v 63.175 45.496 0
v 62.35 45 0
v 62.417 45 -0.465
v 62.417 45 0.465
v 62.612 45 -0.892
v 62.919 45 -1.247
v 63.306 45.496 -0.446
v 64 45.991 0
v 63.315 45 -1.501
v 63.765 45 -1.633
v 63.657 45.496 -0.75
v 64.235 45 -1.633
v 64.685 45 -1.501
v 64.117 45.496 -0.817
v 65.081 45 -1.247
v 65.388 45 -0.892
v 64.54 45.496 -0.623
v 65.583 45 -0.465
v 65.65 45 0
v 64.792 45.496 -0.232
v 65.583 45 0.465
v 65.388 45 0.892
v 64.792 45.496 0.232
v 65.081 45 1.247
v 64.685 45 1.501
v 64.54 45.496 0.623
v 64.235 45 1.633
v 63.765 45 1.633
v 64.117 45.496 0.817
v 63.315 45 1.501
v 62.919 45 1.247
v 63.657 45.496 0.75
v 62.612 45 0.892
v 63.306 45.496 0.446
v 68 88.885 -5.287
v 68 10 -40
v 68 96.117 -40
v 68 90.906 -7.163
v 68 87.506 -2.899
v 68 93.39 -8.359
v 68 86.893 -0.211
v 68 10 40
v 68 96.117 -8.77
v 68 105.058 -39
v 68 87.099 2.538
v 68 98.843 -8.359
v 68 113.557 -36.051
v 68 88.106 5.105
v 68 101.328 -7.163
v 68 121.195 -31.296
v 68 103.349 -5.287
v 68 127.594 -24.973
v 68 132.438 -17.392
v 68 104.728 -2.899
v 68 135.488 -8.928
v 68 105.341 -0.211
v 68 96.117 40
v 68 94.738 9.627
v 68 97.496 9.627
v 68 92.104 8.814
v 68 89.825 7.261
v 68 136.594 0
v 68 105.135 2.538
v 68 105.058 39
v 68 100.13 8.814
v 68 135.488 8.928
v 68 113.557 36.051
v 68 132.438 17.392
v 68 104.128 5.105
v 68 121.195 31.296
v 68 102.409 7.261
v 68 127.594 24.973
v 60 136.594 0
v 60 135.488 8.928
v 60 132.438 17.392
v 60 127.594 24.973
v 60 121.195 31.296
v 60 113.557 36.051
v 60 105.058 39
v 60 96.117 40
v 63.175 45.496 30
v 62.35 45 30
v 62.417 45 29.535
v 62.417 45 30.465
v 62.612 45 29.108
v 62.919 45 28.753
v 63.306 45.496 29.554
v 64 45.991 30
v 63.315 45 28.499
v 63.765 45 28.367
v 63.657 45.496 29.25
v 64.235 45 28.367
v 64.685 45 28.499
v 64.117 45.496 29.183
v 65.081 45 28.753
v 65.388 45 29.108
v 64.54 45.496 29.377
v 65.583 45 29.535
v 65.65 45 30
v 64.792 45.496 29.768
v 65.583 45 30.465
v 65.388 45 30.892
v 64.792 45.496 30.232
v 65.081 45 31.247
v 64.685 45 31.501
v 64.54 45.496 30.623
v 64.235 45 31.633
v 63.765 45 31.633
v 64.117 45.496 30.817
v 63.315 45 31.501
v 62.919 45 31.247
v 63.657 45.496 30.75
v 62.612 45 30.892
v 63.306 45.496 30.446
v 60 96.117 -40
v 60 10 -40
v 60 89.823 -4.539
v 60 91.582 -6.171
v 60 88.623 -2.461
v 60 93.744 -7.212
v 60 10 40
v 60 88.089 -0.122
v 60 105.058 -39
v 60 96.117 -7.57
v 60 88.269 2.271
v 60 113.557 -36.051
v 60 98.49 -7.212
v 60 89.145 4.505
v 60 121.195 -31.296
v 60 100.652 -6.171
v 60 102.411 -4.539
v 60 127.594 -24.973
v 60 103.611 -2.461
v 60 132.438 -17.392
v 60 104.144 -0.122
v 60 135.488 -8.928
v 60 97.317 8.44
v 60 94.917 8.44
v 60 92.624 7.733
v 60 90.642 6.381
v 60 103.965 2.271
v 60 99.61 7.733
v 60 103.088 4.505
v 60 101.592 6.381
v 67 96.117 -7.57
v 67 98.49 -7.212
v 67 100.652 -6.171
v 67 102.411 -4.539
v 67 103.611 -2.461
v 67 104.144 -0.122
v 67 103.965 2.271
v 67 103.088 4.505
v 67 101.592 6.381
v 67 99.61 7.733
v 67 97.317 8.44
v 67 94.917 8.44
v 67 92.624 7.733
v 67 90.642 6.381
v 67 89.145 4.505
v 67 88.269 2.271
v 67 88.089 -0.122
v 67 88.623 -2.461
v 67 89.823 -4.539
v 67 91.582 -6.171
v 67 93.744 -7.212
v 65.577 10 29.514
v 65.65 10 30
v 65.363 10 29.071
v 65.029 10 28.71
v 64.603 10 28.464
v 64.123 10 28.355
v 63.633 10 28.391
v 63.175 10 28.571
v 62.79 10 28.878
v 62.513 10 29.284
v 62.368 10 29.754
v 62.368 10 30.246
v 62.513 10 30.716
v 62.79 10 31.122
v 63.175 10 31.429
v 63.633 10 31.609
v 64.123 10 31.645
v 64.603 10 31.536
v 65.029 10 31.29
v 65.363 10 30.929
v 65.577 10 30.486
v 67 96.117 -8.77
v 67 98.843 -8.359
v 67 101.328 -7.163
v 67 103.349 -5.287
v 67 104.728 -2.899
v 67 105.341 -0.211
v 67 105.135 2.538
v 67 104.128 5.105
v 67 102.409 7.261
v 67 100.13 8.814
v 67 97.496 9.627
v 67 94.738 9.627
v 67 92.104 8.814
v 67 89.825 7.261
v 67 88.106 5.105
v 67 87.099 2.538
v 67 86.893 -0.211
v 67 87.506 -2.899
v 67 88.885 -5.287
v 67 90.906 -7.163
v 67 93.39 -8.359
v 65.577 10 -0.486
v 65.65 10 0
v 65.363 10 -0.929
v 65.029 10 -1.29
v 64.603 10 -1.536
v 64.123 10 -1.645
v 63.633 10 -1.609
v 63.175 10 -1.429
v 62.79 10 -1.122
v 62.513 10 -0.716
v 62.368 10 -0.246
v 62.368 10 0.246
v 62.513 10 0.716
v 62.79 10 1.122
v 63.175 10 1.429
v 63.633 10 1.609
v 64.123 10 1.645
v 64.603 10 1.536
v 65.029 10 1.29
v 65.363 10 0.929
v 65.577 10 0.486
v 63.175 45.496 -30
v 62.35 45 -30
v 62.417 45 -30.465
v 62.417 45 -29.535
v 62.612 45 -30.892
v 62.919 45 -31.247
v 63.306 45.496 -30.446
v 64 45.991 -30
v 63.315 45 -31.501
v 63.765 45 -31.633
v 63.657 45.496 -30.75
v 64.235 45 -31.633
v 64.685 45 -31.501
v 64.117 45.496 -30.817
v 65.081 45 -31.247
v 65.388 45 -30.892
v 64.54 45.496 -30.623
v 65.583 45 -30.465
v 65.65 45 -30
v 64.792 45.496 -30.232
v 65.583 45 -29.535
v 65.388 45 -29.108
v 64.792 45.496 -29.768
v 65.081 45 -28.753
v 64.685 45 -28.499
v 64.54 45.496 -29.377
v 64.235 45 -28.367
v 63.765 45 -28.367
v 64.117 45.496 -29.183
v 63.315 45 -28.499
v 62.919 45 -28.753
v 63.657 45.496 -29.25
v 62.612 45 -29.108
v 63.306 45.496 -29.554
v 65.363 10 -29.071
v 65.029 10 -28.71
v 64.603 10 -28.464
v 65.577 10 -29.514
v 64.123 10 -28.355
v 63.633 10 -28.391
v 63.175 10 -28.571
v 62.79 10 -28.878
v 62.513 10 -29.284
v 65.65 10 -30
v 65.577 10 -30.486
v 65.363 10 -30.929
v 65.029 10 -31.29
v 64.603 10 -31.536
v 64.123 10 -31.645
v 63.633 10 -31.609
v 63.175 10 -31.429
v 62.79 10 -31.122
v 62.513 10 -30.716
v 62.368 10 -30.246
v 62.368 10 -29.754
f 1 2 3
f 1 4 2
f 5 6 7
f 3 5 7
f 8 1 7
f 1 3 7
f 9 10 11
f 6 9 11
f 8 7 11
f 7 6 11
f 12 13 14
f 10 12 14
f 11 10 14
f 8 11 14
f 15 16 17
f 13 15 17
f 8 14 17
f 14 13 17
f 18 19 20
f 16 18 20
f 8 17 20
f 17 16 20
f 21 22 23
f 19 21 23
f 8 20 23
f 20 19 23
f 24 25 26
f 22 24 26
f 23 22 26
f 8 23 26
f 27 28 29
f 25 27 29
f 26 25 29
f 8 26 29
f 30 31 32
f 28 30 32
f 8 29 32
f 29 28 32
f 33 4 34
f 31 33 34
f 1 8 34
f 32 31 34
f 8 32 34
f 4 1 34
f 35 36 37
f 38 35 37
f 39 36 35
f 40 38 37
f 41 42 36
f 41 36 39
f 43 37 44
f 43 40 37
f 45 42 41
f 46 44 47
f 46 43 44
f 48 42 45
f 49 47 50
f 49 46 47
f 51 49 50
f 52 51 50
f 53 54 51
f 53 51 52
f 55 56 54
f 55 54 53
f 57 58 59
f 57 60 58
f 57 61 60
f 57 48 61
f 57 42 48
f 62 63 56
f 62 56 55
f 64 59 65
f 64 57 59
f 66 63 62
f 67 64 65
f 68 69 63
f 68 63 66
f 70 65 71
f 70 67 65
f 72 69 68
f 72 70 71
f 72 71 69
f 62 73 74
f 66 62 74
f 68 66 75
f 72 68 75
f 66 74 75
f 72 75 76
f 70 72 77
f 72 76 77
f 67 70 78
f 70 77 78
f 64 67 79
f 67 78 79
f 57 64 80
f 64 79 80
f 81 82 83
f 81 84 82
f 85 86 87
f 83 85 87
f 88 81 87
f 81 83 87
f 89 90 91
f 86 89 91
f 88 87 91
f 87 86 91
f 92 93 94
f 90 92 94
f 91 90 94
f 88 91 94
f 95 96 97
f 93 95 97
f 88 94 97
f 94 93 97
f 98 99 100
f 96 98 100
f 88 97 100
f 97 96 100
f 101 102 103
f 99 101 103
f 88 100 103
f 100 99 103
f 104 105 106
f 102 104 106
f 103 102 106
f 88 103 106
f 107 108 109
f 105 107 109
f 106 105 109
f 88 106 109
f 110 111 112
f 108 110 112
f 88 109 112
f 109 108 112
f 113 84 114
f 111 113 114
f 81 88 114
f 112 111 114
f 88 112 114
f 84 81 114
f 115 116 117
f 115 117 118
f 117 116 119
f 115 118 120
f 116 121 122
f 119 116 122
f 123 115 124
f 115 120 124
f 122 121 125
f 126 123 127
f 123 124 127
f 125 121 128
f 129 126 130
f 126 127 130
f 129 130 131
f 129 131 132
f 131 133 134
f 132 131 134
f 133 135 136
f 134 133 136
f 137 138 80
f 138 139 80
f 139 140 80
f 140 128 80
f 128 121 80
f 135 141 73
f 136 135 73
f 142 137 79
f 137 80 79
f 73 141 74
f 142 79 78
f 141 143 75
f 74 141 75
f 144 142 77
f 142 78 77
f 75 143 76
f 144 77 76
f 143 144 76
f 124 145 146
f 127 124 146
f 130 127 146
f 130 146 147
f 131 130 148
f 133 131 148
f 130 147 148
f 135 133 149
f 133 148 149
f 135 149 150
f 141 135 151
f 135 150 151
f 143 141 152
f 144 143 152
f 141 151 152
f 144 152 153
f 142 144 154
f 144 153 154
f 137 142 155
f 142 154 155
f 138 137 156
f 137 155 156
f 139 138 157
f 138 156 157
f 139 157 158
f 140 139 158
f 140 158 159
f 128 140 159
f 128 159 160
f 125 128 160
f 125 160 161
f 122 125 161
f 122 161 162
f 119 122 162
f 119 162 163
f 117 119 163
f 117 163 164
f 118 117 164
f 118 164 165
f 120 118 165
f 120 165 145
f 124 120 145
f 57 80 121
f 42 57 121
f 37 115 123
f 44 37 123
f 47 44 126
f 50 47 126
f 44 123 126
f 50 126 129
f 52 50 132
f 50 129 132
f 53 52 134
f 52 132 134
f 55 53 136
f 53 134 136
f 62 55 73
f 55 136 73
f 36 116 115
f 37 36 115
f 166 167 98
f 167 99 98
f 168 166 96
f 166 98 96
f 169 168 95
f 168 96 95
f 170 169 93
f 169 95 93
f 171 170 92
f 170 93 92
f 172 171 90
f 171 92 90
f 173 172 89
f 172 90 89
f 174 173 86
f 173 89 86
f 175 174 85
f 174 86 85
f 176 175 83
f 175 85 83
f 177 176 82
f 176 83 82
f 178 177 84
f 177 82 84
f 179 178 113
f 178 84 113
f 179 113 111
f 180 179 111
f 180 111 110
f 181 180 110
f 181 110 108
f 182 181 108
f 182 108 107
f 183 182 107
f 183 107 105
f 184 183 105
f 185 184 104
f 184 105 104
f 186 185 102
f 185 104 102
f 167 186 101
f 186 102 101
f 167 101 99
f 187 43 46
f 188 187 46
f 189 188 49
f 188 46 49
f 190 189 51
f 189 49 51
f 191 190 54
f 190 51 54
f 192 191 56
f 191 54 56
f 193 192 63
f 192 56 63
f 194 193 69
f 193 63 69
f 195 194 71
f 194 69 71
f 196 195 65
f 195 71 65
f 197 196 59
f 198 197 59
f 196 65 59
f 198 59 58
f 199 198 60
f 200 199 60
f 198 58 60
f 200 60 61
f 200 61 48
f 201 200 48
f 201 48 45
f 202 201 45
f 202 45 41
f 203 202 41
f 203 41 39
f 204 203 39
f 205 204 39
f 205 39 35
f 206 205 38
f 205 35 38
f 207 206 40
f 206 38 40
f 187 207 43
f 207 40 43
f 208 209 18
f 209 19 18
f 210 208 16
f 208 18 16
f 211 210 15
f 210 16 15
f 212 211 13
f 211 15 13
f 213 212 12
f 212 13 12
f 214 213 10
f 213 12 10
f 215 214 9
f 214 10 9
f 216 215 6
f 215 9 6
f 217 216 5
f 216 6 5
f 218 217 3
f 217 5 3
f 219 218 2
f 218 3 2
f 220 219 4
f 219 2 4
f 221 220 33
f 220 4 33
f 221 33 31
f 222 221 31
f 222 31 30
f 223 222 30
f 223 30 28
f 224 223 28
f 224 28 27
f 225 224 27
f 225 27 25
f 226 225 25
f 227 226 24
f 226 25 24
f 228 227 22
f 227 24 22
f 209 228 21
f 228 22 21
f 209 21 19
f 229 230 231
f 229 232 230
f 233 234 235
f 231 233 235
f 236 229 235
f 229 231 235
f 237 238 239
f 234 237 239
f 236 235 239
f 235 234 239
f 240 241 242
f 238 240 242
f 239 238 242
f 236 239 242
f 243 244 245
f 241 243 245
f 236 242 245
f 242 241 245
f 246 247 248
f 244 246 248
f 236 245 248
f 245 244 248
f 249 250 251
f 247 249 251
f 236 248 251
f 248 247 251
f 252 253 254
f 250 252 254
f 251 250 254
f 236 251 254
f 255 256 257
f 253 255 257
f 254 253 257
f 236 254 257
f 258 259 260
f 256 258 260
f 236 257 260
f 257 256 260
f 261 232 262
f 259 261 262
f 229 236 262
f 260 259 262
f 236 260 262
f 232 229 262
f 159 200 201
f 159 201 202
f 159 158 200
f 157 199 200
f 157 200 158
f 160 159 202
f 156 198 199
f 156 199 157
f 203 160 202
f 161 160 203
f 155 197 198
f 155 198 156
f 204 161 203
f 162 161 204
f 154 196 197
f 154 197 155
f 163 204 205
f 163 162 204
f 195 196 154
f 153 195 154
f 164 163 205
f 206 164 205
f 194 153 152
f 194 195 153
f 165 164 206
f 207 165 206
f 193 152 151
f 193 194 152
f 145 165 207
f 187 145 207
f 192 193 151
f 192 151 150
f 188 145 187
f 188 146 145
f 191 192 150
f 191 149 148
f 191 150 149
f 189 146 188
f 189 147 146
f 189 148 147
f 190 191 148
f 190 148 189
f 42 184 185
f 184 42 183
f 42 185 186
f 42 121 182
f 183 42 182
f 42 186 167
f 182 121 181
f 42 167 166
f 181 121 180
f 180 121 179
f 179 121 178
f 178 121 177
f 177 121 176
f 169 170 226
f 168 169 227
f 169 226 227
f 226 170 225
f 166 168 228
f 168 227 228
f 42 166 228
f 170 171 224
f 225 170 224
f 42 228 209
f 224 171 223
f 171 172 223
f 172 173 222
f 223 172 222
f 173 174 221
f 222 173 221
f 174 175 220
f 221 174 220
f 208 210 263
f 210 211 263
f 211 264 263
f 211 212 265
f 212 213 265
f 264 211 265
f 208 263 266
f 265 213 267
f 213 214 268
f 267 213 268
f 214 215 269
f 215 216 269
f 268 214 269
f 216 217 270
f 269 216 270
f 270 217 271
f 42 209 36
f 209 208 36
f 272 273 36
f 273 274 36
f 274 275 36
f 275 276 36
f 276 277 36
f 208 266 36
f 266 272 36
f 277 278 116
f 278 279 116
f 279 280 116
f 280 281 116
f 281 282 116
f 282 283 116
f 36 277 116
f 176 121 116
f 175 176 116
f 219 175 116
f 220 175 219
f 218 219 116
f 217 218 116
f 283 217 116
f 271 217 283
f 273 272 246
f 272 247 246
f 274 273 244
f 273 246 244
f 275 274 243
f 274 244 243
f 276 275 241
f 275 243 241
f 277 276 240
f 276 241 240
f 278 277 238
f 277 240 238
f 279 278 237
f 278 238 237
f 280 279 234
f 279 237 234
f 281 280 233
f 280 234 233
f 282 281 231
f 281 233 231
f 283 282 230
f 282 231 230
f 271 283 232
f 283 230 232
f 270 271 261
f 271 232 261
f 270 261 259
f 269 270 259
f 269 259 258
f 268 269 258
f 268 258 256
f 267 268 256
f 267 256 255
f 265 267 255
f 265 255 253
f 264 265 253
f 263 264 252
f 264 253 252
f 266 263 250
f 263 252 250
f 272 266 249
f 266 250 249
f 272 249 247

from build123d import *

# Parameters (mm, degrees)
STOCK_NEW_TRACKER_1_START = 60
STOCK_NEW_TRACKER_1_DEPTH = 8
SKETCH1_R                 = 9.25
CUT_EXTRUDE1_DEPTH        = 1
SKETCH2_R                 = 8.05
CUT_EXTRUDE2_DEPTH        = 143.502485249
M4X0_7_TAPPED_HOLE1_D     = 3.3
M4X0_7_TAPPED_HOLE1_DEPTH = 35
M4X0_7_TAPPED_HOLE1_TIP   = 0.991420021


# Read off the part's stored shape, not the designer's step: Stock-New_Tracker-1
with BuildPart() as part:
    # Stock-New_Tracker-1 outline → Stock-New_Tracker-1 (new body)
    with BuildSketch(Plane.YZ.offset(STOCK_NEW_TRACKER_1_START)):
        with BuildLine():
            Line((10, 40), (10, -40))
            Line((10, -40), (96.116983094, -40))
            ThreePointArc((96.116983094, -40), (124.570453884, -28.312888011), (136.594137144, 0))
            ThreePointArc((136.594137144, 0), (124.570453884, 28.312888011), (96.116983094, 40))
            Line((96.116983094, 40), (10, 40))
        make_face()
    extrude(amount=STOCK_NEW_TRACKER_1_DEPTH)

    # Sketch1 → Cut-Extrude1 (cut)
    with BuildSketch(Plane(origin=(68, 0, 0), x_dir=(0, 0, -1), z_dir=(1, 0, 0))):
        with Locations((-0.48, 96.116983094)):
            Circle(SKETCH1_R)
    extrude(amount=-CUT_EXTRUDE1_DEPTH, mode=Mode.SUBTRACT)

    # Sketch2 → Cut-Extrude2 (cut, through all)
    with BuildSketch(Plane(origin=(67, 0, 0), x_dir=(0, 0, -1), z_dir=(1, 0, 0))):
        with Locations((-0.48, 96.116983094)):
            Circle(SKETCH2_R)
    extrude(amount=-CUT_EXTRUDE2_DEPTH, mode=Mode.SUBTRACT)

    # M4x0.7 Tapped Hole1
    with Locations(Plane(origin=(0, 10, 0), x_dir=(-1, 0, 0), z_dir=(0, -1, 0))):
        with Locations((-64, -30), (-64, 0), (-64, 30)):
            Hole(M4X0_7_TAPPED_HOLE1_D / 2, depth=M4X0_7_TAPPED_HOLE1_DEPTH)
            with Locations((0, 0, -(M4X0_7_TAPPED_HOLE1_DEPTH + M4X0_7_TAPPED_HOLE1_TIP / 2))):  # 118° drill point
                Cone(0, M4X0_7_TAPPED_HOLE1_D / 2, M4X0_7_TAPPED_HOLE1_TIP, mode=Mode.SUBTRACT)


solid = part.part
